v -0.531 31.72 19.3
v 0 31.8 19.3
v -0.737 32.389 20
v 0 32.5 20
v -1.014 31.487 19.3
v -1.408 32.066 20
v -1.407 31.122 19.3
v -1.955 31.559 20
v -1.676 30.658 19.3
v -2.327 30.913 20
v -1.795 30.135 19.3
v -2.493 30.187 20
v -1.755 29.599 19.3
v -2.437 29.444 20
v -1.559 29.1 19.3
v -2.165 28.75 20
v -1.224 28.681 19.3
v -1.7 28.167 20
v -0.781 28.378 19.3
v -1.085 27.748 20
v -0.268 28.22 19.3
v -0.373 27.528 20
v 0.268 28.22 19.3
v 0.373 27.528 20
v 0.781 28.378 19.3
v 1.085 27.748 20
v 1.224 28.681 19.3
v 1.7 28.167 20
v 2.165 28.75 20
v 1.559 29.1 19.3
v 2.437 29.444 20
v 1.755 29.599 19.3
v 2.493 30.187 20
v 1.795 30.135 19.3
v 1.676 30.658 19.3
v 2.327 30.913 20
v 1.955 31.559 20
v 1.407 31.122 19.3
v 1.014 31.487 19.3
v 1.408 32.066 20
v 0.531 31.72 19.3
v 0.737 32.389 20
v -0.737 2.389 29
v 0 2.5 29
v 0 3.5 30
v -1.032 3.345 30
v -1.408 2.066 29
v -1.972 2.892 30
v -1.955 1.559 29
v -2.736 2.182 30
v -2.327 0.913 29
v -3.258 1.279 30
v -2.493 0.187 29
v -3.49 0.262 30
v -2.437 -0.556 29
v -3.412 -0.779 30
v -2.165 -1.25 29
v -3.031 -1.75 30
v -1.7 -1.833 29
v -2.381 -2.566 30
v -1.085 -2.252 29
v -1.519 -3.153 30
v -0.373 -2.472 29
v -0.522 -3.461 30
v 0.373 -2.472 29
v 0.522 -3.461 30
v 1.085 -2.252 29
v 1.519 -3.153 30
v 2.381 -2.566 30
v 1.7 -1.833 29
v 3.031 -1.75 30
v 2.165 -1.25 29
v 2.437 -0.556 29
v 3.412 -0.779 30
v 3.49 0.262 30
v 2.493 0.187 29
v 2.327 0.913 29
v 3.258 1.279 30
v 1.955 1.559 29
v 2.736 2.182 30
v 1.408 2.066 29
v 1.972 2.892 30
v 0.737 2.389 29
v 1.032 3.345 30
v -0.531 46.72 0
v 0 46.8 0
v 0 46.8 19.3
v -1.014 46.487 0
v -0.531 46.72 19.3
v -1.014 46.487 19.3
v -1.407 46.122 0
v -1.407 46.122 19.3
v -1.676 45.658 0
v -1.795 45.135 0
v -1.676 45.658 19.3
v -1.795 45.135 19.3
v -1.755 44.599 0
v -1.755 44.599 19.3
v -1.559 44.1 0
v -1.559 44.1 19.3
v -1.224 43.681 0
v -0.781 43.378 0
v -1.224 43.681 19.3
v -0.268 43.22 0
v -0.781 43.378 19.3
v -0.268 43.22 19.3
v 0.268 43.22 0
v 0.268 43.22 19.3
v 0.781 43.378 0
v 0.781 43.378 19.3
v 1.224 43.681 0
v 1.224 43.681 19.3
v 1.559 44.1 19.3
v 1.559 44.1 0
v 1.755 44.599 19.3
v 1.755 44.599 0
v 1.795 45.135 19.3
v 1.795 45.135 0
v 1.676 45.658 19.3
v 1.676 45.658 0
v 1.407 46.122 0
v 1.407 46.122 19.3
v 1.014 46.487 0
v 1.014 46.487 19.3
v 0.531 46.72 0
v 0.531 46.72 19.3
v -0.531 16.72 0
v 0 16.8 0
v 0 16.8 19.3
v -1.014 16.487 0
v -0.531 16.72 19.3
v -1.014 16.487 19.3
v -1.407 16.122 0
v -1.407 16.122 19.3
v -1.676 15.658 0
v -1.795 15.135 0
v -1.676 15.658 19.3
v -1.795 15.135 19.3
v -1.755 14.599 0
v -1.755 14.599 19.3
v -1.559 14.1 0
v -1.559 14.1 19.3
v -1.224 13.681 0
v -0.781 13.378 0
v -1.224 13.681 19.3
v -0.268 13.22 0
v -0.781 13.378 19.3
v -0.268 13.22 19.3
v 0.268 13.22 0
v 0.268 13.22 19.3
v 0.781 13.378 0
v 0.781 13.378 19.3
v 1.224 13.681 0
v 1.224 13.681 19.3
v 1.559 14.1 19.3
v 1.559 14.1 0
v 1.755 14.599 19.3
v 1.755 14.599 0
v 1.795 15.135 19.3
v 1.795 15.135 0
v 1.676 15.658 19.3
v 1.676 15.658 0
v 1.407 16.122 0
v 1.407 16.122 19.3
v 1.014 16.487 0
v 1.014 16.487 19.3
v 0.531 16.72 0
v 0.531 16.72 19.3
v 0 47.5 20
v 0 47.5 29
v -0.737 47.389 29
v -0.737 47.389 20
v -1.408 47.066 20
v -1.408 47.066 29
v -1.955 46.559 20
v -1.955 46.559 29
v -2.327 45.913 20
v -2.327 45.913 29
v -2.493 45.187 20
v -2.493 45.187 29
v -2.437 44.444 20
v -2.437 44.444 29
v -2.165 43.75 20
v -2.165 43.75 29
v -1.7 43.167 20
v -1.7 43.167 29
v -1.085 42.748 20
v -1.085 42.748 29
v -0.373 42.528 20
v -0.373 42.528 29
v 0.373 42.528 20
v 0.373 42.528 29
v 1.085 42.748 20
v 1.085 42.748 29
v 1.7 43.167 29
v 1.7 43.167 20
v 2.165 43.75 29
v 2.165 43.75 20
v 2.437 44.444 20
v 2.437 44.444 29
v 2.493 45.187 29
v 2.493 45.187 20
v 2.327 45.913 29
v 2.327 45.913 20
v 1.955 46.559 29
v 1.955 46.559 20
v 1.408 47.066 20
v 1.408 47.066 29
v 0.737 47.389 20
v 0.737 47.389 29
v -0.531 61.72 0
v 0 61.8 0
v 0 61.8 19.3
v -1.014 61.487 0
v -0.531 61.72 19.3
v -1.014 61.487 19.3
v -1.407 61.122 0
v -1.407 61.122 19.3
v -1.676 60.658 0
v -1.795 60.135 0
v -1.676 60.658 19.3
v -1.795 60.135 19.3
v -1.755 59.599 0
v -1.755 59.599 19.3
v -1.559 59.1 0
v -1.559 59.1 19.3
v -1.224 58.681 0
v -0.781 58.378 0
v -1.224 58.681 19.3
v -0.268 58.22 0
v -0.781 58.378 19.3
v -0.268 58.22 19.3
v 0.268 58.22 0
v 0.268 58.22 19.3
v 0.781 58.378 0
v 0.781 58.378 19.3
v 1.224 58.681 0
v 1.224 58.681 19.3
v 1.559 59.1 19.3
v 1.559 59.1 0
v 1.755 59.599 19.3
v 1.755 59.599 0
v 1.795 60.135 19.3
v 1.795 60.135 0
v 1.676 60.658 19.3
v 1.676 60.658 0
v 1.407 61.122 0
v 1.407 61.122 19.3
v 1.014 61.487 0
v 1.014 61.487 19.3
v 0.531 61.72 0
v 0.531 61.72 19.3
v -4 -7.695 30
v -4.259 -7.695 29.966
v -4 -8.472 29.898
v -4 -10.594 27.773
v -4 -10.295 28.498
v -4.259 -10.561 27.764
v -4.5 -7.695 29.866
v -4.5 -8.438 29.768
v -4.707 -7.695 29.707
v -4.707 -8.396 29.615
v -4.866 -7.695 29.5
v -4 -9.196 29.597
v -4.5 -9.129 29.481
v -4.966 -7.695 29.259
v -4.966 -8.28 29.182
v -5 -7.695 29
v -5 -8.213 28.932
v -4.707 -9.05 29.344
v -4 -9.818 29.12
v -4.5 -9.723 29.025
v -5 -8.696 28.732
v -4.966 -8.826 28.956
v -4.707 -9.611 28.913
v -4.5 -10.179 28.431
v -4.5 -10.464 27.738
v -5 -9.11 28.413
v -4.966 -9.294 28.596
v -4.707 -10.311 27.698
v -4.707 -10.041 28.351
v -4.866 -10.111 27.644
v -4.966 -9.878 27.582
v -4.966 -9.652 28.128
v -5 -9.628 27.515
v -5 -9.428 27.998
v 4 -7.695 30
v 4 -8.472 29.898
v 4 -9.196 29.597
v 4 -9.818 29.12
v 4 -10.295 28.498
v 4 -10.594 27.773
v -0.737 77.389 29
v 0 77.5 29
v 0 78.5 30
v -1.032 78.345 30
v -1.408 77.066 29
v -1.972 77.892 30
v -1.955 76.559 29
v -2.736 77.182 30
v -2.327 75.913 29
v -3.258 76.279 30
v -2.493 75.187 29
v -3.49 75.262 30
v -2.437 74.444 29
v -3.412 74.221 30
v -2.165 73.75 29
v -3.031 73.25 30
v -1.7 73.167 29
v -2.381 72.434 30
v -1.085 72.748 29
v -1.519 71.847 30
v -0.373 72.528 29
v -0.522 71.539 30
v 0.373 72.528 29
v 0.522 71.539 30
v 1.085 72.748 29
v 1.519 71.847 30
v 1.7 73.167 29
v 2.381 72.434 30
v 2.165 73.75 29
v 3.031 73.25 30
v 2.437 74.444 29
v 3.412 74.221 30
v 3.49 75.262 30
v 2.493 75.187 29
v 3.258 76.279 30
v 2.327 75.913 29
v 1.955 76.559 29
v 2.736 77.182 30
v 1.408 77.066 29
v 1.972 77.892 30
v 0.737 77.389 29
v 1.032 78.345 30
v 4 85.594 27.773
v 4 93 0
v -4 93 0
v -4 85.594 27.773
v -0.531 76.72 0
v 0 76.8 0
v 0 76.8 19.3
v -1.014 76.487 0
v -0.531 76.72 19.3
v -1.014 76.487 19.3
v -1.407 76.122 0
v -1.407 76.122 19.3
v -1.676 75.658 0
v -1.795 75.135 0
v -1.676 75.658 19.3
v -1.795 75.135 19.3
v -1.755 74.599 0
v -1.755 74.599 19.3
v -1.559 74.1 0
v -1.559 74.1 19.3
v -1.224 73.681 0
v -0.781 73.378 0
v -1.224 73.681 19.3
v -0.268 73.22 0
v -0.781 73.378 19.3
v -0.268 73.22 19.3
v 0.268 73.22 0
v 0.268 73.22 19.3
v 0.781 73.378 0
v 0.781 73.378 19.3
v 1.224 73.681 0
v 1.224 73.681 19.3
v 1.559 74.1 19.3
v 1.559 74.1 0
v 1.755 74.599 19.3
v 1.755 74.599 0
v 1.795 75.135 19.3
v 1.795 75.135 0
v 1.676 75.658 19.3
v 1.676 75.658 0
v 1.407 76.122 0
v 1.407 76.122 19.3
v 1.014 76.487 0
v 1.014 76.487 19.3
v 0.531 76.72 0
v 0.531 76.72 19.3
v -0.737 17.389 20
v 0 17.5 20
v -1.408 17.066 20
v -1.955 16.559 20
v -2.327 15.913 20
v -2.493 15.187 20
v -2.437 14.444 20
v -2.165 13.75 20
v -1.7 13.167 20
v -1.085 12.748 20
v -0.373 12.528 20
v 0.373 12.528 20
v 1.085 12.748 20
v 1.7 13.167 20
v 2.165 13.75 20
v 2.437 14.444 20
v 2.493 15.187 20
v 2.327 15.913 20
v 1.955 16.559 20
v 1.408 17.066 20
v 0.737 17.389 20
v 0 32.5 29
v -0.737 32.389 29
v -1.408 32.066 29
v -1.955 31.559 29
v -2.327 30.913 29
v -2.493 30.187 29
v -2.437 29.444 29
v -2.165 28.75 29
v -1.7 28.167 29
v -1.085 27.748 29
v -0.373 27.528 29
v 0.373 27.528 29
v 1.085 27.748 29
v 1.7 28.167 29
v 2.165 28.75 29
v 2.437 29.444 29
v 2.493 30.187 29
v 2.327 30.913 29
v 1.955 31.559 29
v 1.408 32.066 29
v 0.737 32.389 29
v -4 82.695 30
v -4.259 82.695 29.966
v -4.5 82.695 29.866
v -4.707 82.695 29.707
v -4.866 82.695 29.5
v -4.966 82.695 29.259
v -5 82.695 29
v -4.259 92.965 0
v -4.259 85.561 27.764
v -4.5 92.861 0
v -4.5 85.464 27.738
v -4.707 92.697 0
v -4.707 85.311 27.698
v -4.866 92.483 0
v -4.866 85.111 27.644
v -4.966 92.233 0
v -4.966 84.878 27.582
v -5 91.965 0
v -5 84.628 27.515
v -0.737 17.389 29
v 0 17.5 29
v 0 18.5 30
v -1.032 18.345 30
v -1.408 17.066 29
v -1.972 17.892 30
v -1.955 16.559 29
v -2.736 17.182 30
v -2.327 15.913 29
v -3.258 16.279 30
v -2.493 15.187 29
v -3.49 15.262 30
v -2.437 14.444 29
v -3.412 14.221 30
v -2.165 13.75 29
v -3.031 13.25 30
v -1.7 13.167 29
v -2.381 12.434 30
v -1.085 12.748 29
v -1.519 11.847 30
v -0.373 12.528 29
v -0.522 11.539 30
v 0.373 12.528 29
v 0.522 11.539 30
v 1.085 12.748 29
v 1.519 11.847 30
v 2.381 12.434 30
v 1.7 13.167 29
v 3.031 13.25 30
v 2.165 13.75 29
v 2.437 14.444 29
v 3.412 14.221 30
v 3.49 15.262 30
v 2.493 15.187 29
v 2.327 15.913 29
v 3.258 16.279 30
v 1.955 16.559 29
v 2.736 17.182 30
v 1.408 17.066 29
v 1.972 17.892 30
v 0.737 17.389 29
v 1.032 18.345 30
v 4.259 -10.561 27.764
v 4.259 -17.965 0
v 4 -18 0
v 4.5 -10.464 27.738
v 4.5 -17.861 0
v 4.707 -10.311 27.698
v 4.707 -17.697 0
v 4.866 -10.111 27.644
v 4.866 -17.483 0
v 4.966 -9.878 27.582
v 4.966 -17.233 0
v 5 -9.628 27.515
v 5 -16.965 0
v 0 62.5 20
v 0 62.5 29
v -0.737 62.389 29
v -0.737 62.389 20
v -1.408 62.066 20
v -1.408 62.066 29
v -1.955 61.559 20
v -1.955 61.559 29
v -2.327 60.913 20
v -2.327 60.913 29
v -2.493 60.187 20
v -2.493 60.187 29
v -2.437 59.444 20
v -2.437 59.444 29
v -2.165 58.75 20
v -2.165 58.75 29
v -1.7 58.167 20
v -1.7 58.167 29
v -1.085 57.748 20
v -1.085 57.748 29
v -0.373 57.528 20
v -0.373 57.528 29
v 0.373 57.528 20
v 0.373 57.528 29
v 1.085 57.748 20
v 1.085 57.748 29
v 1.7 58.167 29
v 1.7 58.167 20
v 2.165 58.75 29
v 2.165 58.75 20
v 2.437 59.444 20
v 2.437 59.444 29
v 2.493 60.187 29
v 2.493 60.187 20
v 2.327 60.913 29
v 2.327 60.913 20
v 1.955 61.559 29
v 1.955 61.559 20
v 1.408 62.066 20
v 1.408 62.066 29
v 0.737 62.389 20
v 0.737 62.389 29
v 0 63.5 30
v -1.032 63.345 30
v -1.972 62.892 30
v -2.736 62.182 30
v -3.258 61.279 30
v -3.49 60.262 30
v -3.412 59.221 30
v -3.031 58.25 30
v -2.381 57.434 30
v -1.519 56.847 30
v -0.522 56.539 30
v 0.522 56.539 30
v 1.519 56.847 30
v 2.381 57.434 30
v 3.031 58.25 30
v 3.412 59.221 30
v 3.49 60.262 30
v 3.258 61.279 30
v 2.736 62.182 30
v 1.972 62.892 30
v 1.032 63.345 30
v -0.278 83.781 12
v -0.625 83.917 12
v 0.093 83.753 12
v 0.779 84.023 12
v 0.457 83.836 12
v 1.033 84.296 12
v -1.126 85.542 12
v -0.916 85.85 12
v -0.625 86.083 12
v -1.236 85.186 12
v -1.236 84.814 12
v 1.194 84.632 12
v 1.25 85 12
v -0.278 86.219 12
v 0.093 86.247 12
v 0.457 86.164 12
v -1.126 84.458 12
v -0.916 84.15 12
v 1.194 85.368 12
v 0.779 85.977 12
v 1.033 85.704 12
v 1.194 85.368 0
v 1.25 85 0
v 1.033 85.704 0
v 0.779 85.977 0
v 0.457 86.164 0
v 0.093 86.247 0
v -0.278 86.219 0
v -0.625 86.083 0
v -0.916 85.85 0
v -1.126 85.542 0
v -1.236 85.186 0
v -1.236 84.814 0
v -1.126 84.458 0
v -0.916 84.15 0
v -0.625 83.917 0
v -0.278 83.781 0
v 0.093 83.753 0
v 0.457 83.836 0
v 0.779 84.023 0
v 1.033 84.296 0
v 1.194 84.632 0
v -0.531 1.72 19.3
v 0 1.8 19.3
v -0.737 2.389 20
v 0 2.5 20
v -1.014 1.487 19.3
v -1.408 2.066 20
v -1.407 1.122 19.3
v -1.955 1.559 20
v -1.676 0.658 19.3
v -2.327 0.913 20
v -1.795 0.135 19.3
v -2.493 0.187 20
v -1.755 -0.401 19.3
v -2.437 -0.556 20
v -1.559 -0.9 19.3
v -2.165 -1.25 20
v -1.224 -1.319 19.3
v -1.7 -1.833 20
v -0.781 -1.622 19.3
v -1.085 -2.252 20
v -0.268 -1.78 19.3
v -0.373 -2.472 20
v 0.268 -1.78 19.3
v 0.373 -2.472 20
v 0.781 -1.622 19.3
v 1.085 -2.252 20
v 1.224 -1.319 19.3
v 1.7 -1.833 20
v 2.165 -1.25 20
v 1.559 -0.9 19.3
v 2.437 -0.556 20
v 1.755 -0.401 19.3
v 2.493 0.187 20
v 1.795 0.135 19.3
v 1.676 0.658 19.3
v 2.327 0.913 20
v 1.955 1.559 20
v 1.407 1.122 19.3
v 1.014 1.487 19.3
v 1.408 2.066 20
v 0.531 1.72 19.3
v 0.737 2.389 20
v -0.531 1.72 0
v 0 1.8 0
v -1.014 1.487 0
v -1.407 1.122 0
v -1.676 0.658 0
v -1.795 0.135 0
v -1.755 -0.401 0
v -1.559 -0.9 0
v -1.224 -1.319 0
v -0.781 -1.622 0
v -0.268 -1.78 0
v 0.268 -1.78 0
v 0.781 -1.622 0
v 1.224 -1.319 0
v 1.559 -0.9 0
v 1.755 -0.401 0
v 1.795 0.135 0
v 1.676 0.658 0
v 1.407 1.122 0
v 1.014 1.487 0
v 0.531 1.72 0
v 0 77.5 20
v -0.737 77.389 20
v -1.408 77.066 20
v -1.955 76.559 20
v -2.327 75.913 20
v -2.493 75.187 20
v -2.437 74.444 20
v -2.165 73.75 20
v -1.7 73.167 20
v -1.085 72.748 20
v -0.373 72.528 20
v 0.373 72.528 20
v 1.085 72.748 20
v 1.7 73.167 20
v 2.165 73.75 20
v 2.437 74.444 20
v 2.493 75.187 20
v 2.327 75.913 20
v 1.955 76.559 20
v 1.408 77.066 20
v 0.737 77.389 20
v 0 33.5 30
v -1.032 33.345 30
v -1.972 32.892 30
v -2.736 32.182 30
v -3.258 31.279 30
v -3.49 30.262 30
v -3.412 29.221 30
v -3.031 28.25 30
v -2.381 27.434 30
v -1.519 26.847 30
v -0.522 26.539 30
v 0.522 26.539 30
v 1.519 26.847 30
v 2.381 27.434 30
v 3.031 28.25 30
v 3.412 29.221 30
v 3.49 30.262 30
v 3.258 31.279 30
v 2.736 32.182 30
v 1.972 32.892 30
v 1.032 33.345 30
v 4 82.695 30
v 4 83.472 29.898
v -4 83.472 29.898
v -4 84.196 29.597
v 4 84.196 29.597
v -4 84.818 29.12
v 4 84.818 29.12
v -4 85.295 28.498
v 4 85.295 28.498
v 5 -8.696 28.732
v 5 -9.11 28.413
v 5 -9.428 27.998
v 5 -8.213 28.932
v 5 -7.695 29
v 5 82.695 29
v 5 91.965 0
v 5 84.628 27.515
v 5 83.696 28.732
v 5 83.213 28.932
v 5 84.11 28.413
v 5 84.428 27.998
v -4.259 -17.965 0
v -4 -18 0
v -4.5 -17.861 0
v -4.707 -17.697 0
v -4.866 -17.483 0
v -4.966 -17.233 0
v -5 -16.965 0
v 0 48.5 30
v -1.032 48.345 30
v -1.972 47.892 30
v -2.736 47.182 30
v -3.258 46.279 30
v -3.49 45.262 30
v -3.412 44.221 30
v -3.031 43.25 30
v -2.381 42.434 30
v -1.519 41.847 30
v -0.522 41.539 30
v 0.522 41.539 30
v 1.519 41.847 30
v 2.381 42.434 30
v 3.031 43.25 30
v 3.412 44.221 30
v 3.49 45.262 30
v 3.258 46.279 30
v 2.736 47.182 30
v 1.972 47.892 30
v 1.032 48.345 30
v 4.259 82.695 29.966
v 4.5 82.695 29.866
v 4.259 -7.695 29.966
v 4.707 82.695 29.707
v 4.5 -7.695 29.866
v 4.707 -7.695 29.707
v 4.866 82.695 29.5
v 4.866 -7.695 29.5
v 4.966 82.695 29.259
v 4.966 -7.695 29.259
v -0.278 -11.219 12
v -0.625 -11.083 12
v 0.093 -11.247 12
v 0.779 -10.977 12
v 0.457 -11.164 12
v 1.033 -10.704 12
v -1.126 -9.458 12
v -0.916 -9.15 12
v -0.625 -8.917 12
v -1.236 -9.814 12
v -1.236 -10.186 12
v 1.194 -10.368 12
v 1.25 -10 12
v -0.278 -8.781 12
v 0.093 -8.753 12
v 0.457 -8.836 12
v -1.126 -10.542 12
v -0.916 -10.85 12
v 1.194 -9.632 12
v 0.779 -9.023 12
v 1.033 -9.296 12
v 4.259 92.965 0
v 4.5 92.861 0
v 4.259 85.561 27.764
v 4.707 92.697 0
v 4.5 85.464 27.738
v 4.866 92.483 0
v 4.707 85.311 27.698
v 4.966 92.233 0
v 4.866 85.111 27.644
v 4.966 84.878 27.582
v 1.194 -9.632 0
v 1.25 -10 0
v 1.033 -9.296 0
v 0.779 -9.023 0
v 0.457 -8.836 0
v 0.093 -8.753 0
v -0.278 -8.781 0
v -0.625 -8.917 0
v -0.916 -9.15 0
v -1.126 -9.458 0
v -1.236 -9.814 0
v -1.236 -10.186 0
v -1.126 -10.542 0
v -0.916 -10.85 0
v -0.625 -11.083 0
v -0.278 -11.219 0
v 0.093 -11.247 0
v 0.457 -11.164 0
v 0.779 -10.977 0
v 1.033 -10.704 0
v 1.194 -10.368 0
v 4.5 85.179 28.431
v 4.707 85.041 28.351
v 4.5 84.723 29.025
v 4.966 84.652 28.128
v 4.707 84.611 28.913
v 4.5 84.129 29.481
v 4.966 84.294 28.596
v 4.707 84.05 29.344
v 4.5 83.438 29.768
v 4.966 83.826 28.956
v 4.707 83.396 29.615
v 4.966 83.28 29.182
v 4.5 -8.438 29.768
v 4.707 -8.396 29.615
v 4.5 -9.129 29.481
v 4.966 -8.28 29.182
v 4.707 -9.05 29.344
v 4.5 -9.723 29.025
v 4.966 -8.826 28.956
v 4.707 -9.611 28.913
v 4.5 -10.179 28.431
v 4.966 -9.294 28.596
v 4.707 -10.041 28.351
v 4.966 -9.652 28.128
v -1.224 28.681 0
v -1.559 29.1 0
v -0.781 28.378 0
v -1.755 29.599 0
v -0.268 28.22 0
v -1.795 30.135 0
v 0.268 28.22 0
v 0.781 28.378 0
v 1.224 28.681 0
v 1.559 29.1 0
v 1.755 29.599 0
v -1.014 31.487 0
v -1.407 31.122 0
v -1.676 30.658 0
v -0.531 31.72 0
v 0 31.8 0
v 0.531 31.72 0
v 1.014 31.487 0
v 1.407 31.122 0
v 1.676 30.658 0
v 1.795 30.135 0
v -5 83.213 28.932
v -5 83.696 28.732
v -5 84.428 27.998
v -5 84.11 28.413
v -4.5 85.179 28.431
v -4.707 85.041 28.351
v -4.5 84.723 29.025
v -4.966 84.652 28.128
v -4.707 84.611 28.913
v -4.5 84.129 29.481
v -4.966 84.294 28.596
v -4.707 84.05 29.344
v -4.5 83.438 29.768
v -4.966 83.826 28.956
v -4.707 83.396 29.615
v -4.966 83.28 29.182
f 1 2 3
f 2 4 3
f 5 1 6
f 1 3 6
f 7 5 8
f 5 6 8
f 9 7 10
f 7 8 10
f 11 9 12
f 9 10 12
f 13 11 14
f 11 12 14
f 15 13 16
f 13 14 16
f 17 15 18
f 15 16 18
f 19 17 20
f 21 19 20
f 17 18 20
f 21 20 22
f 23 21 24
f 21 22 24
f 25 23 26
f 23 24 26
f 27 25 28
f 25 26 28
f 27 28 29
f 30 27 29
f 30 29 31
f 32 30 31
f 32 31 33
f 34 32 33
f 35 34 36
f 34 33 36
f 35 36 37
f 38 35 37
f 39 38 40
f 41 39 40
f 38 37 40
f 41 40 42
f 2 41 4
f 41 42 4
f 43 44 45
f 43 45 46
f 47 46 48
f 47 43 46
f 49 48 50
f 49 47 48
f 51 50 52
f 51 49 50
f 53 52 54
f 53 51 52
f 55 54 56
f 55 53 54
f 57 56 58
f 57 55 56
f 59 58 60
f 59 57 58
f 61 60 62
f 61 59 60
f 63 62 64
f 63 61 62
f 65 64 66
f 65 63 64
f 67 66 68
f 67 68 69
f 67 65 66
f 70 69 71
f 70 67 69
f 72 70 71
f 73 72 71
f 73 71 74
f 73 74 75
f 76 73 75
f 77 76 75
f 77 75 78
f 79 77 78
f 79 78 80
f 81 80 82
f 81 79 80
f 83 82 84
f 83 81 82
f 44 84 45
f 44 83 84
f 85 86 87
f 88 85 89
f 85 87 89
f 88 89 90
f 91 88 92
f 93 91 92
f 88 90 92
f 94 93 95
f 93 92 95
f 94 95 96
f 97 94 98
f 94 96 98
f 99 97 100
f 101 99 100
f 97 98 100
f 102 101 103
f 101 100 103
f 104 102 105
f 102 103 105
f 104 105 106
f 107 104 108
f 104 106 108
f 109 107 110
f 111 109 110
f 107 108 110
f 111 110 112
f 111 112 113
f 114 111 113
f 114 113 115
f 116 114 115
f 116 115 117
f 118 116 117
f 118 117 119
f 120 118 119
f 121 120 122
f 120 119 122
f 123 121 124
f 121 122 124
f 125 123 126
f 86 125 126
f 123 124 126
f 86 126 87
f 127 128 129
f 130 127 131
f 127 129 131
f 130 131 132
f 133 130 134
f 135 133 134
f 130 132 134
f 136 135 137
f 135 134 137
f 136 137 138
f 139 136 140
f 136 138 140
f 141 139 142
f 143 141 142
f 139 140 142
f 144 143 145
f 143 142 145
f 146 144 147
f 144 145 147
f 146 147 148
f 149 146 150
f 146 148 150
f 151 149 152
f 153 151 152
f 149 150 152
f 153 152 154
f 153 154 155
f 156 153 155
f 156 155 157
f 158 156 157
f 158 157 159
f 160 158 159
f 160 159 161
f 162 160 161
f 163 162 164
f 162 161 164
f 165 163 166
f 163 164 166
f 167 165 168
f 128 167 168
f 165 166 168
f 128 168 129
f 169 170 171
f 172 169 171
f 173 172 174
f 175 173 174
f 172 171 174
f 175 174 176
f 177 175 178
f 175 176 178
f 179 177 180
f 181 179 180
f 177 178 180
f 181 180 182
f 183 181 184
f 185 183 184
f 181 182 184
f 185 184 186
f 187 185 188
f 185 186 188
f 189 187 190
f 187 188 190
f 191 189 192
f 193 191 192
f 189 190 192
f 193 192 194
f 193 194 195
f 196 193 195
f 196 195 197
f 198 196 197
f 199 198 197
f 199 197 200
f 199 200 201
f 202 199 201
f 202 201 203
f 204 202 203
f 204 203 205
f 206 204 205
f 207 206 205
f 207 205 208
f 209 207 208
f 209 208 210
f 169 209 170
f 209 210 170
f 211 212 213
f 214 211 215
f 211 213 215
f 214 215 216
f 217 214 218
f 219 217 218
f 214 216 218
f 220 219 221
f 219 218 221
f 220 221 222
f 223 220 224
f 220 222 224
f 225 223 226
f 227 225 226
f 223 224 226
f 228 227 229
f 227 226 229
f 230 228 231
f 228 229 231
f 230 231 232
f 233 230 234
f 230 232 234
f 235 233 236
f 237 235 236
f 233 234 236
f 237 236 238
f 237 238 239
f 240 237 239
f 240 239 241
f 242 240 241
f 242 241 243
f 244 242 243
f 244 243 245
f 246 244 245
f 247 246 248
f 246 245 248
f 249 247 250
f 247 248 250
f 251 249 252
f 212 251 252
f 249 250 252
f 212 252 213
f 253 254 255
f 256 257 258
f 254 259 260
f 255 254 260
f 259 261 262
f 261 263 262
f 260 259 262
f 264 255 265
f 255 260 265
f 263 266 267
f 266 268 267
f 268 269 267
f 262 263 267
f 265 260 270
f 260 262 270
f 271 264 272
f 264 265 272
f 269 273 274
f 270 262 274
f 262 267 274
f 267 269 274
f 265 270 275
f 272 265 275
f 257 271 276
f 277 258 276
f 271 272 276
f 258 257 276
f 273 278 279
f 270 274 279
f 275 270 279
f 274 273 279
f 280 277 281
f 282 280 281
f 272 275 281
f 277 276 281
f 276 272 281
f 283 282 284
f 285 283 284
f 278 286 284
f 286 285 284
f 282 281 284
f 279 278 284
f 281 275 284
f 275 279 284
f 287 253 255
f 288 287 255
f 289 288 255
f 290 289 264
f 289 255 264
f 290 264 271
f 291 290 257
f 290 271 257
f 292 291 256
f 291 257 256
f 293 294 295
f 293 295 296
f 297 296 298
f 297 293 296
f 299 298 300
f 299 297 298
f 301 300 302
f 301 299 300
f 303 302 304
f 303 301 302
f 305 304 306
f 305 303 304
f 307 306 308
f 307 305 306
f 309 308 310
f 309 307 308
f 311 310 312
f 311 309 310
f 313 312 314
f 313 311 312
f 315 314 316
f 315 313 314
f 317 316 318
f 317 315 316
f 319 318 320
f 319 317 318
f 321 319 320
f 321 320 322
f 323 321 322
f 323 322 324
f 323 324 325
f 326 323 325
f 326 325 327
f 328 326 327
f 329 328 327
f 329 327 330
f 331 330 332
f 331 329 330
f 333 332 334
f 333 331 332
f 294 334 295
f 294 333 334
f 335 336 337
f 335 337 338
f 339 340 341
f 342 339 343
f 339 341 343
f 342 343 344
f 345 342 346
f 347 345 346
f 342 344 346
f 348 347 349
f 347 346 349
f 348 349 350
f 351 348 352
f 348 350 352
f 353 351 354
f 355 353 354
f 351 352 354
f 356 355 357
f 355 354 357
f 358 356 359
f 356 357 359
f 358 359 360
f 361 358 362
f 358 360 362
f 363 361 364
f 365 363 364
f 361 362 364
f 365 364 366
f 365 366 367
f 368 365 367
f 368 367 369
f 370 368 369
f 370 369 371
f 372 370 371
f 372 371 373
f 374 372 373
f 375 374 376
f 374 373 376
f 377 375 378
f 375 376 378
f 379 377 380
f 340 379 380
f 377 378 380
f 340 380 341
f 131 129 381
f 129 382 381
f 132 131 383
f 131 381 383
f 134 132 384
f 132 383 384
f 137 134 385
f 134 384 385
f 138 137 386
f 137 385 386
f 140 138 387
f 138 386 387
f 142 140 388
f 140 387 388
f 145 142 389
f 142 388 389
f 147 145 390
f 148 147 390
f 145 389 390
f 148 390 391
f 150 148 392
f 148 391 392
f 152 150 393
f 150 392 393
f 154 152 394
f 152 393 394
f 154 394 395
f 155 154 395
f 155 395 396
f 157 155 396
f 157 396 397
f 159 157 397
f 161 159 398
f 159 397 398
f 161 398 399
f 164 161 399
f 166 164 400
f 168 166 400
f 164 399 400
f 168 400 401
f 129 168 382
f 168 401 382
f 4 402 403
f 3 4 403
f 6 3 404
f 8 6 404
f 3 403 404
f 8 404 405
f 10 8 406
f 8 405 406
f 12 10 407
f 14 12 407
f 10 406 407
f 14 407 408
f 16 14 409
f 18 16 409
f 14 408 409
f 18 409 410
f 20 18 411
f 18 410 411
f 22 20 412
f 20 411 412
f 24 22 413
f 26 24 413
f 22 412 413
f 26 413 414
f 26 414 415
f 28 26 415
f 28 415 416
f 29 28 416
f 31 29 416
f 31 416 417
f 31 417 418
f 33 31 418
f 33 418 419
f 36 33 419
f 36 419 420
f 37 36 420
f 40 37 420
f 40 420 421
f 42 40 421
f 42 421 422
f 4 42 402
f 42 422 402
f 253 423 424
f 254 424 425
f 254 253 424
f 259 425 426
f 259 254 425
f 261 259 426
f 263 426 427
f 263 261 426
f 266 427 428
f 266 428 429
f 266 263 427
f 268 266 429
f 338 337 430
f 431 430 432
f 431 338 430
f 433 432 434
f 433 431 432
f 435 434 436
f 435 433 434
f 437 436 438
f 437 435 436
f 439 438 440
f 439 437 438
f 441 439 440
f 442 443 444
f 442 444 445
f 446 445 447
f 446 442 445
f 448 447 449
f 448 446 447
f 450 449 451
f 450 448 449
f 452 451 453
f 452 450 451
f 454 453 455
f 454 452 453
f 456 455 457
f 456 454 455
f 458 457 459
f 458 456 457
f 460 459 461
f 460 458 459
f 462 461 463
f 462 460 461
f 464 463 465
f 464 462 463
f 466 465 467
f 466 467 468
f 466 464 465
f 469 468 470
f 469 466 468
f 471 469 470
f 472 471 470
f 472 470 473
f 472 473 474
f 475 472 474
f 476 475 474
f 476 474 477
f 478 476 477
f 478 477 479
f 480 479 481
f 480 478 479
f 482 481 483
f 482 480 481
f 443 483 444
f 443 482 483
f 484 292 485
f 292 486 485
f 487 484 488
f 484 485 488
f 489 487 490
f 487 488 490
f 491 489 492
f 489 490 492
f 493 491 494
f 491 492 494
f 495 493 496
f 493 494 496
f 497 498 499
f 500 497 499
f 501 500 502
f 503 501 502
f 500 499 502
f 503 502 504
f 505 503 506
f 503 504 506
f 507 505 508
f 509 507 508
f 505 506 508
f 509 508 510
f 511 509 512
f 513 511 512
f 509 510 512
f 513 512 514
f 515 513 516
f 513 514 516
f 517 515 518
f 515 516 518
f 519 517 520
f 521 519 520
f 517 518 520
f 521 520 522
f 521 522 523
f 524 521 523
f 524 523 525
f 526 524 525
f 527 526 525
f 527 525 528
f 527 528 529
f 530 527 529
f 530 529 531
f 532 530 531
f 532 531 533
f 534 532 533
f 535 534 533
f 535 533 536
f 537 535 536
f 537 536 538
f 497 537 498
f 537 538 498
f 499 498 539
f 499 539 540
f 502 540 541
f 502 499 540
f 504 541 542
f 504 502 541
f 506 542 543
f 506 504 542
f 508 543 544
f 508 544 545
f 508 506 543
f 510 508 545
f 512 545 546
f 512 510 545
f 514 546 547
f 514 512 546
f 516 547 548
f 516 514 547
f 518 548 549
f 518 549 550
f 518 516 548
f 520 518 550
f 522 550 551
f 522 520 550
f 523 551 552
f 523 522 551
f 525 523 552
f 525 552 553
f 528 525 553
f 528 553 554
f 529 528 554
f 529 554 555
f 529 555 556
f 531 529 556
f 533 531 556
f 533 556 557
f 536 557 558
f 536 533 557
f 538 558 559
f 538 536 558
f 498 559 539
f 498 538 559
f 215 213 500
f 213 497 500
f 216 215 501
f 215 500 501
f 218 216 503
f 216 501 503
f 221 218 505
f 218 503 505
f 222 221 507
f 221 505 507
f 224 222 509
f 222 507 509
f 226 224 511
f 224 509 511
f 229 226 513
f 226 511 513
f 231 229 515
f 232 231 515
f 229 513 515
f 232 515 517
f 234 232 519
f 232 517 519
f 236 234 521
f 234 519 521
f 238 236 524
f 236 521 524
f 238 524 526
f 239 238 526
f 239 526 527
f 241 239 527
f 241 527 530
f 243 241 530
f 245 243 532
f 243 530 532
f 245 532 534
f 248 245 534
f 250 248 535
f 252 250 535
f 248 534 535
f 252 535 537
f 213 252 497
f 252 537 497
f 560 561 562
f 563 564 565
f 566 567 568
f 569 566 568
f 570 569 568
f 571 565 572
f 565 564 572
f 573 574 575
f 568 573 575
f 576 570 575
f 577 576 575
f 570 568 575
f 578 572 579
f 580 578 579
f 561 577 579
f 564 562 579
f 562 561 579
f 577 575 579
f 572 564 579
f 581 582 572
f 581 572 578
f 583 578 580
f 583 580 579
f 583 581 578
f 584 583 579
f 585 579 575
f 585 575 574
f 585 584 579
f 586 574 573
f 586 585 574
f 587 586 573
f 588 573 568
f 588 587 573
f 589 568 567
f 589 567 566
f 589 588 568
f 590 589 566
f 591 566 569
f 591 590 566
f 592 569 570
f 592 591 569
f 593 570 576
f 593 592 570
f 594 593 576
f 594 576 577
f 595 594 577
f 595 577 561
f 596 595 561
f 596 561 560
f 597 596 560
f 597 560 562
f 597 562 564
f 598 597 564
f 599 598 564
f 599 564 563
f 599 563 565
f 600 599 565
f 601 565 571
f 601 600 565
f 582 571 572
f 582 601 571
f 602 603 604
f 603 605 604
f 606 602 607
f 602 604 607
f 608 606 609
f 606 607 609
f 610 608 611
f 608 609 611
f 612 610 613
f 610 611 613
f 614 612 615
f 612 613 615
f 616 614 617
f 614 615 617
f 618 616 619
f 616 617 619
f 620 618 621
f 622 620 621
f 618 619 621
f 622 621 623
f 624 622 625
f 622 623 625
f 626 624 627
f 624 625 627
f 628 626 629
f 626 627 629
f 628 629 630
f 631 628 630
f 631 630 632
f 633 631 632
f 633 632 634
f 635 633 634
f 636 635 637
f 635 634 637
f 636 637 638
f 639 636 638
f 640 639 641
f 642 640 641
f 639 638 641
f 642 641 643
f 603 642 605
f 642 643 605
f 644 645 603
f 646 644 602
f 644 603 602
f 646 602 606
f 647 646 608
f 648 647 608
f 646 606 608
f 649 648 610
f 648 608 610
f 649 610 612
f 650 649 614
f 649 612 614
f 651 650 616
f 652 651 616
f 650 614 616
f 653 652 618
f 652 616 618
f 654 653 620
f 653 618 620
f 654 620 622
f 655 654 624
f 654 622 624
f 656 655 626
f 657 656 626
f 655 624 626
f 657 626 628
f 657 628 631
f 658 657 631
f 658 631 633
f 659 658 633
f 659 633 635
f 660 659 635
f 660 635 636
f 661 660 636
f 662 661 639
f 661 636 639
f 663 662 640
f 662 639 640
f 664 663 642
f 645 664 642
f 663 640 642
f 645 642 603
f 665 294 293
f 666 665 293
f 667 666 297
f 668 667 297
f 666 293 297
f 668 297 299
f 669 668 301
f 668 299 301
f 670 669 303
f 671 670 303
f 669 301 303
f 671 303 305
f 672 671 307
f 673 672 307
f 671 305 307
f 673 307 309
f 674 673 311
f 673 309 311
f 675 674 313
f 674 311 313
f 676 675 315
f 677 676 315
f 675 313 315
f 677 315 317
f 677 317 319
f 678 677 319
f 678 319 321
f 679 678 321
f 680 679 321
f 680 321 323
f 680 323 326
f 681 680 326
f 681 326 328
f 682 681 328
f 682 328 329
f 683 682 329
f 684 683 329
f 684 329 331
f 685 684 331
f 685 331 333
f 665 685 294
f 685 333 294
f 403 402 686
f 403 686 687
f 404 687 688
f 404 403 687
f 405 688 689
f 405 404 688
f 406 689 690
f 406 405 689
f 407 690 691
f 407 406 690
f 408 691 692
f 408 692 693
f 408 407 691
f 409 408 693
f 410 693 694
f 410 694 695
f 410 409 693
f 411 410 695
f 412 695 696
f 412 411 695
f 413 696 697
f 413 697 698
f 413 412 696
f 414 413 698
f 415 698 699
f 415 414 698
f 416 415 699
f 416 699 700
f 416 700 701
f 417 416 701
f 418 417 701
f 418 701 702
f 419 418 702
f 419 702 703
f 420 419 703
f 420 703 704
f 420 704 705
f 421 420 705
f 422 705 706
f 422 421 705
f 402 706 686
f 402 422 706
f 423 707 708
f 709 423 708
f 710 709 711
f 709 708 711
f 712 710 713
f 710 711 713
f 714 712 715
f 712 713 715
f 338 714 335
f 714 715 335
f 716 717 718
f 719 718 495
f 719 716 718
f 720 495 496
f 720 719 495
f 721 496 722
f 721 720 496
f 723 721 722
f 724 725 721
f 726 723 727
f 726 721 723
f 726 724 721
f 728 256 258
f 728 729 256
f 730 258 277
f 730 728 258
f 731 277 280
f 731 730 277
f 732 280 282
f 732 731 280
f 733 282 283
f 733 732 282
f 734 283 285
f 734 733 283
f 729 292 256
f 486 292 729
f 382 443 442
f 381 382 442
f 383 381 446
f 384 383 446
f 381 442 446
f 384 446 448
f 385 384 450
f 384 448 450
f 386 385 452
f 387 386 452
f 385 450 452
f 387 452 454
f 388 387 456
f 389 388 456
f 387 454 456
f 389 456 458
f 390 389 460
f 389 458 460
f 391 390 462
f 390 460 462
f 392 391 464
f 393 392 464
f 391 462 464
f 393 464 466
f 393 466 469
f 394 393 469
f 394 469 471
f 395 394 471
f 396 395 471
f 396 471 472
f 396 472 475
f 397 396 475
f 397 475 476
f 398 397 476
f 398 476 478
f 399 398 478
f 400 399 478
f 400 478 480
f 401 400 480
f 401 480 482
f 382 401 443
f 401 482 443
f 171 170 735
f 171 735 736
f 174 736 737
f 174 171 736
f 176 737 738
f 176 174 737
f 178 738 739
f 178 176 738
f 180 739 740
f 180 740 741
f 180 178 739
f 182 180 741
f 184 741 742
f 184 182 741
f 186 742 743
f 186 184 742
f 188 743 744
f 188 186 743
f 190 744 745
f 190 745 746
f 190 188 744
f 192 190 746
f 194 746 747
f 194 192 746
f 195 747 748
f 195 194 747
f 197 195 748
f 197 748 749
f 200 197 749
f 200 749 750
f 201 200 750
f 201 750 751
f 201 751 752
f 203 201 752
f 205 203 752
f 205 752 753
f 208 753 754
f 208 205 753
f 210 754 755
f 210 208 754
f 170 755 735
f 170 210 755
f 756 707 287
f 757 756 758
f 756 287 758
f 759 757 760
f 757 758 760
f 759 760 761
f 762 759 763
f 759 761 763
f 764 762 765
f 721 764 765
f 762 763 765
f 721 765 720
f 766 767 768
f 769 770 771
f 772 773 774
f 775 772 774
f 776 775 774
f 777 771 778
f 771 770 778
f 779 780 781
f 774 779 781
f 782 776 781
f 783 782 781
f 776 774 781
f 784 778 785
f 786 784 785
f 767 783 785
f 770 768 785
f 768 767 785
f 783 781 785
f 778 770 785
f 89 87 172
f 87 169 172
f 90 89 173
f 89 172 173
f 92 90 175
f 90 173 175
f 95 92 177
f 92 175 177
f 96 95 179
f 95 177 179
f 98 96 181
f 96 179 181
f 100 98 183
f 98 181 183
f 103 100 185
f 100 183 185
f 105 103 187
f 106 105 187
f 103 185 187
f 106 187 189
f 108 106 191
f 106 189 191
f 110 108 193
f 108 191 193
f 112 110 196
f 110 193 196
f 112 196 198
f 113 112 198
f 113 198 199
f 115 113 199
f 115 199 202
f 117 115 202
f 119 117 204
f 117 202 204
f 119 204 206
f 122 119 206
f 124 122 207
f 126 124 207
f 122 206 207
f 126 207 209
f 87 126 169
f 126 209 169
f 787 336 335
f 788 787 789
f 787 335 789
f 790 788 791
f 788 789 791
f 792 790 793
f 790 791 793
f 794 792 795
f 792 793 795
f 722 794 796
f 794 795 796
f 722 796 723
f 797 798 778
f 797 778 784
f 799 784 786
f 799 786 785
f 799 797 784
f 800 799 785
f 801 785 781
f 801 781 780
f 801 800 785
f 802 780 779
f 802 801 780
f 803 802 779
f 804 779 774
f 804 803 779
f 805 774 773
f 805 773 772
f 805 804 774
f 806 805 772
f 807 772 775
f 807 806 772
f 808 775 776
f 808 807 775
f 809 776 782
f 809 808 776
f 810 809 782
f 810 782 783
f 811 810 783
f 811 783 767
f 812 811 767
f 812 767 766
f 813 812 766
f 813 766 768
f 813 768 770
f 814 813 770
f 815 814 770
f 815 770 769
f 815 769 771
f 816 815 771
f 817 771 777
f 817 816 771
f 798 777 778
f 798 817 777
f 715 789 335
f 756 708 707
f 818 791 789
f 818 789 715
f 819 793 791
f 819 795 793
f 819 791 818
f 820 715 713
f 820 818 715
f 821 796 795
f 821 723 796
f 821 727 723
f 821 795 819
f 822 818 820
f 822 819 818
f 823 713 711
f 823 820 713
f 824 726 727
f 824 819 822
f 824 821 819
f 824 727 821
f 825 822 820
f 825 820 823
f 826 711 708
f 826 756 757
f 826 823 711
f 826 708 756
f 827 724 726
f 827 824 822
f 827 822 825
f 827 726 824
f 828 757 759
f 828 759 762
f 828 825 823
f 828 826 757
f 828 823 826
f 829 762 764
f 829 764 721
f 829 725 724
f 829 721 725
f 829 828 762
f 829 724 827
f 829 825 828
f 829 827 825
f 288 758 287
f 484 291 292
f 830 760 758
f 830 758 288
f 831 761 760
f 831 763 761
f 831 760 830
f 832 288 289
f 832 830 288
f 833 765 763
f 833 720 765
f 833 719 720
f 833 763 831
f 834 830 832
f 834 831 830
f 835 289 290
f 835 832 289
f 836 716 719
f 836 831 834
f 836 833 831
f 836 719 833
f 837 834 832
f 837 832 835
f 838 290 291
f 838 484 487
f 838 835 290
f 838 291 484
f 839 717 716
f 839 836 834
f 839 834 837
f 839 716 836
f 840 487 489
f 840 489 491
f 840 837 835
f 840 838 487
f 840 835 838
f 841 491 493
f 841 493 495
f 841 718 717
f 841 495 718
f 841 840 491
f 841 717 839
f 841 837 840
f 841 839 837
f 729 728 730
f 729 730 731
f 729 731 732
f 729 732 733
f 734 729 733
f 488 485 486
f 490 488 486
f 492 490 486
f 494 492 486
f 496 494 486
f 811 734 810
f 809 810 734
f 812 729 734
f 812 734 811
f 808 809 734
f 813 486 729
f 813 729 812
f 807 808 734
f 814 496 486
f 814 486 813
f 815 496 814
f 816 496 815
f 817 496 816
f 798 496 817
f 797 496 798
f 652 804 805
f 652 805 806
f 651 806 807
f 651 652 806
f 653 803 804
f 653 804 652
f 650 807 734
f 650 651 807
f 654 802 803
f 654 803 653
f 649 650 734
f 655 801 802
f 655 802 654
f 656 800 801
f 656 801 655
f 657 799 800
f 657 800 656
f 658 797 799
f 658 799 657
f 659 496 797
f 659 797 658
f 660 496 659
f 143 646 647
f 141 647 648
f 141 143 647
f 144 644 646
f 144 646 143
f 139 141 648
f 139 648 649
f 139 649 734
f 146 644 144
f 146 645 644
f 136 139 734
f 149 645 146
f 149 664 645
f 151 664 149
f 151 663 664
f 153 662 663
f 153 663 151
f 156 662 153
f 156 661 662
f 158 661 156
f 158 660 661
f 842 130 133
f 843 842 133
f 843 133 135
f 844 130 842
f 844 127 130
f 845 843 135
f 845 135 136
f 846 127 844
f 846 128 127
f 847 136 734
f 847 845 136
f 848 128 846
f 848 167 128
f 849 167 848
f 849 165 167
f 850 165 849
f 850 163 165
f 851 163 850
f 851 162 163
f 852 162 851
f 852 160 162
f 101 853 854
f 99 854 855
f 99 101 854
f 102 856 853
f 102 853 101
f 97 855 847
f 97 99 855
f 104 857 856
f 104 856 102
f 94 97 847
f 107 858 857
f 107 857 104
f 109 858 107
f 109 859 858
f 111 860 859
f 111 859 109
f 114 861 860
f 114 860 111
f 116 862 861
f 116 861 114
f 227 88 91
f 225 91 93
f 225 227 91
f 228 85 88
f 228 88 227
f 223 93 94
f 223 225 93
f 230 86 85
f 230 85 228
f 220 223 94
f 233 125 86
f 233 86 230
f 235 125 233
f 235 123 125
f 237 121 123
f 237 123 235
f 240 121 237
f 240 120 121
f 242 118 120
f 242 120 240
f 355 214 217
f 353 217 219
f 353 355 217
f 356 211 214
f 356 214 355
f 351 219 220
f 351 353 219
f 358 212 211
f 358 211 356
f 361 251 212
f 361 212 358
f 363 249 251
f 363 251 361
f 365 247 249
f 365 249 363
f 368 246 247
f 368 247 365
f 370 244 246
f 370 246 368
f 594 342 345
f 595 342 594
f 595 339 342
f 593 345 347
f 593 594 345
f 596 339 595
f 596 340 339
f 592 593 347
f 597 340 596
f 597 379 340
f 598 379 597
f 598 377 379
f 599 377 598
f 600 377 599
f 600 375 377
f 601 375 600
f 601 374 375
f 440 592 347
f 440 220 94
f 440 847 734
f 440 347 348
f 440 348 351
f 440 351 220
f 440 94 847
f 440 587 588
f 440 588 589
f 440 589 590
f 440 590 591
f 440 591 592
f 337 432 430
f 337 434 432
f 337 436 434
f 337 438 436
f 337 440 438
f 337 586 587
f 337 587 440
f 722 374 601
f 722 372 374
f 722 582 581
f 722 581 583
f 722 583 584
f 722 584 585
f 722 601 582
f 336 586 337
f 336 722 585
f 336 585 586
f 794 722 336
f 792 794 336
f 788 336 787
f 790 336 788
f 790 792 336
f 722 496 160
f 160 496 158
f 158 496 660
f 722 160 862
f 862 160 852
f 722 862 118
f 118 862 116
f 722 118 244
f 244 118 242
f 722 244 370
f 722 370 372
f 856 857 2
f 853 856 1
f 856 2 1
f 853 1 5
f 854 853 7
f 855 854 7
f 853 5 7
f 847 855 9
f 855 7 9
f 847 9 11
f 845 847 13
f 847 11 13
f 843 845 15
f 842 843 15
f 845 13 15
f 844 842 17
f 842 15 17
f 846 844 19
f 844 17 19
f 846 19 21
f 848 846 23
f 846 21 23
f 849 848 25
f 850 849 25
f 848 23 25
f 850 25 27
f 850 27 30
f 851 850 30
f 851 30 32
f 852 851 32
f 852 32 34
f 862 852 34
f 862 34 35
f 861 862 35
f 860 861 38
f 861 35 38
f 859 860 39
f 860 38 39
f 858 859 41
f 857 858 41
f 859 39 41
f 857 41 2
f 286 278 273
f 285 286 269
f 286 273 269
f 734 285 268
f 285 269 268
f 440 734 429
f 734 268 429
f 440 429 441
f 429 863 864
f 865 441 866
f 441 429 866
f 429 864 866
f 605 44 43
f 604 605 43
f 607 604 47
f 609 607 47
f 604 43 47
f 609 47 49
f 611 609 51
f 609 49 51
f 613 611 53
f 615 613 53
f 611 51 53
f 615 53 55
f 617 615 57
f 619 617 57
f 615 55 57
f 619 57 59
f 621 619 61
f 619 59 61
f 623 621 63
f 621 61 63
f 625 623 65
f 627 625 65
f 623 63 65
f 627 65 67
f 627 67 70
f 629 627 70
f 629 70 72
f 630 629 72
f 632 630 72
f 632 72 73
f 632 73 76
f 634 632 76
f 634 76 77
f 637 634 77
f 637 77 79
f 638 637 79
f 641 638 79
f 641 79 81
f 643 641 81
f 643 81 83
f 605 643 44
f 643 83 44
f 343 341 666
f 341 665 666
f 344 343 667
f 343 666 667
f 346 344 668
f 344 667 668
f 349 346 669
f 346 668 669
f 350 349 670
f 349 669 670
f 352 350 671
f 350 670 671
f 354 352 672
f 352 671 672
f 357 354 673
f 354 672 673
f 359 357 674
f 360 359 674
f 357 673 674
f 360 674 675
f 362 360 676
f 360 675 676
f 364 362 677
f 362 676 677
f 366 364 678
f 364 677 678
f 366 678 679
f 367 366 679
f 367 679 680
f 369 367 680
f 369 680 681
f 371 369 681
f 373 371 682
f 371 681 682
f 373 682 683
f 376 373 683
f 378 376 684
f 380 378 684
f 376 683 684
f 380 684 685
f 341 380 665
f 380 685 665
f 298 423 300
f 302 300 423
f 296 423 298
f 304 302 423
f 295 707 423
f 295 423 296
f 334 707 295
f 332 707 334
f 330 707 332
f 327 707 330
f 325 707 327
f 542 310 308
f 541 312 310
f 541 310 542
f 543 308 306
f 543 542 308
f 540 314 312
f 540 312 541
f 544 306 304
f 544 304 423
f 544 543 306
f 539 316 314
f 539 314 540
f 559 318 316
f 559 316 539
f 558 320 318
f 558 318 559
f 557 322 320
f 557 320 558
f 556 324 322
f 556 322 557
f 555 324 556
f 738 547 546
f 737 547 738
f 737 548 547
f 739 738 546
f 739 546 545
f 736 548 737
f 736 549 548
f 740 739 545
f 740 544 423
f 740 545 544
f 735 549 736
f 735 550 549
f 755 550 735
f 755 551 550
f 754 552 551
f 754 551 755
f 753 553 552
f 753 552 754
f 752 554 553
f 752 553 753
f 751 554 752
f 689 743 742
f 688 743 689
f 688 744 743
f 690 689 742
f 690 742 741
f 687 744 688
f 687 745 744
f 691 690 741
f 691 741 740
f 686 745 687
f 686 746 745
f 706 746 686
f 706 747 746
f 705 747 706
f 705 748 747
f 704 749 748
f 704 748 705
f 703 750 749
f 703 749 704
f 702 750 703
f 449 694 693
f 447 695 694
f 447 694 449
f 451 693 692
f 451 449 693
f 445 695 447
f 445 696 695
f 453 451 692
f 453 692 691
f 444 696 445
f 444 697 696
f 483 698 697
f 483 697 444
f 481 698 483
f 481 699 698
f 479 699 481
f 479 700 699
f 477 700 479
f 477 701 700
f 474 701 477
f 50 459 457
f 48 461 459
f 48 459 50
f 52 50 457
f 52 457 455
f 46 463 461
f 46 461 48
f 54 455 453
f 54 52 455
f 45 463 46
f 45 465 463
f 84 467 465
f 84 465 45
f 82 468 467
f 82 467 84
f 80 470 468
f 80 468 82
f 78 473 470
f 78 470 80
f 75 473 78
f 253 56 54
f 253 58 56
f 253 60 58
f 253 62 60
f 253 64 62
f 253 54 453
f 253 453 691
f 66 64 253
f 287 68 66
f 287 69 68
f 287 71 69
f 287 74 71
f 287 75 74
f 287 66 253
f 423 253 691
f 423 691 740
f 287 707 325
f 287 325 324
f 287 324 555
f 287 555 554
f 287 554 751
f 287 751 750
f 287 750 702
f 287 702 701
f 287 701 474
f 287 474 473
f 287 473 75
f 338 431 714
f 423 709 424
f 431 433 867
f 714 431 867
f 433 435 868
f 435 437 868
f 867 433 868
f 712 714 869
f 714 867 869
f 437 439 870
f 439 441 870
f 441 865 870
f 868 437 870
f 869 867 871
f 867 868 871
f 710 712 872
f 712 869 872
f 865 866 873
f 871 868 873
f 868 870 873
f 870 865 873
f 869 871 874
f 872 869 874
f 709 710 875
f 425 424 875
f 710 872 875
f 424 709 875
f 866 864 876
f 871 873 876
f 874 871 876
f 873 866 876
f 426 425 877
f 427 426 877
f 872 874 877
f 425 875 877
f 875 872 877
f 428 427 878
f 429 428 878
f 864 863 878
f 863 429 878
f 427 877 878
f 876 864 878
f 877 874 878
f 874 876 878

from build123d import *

# Parameters (mm, degrees)
PAD012_DEPTH           = 5
LINEARPATTERN002_COUNT = 6
LINEARPATTERN002_PITCH = 15
SKETCH031_R            = 1.25
POCKET011_DEPTH        = 12
CHAMFER004_SIZE        = 1
FILLET004_R            = 3
FILLET005_R            = 1


with BuildPart() as part:
    # Sketch029 → Pad012 (new body, symmetric)
    with BuildSketch(Plane.YZ):
        Polygon((-18, 0), (93, 0), (85, 30), (-10, 30), align=None)
    extrude(amount=PAD012_DEPTH, both=True)

    # Sketch030 → Groove (revolve, cut)
    with BuildSketch(Plane.YZ):
        Polygon((0, 0), (1.8, 0), (1.8, 19.3), (2.5, 20), (2.5, 30), (0, 30), align=None)
    groove = revolve(axis=Axis((0, 0, 0), (0, 0, 1)), mode=Mode.SUBTRACT)

    # LinearPattern002: Groove ×6
    with Locations(*[(0, i * LINEARPATTERN002_PITCH, 0) for i in range(1, LINEARPATTERN002_COUNT)]):
        add(groove, mode=Mode.SUBTRACT)

    # Sketch031 → Pocket011 (cut)
    with BuildSketch(Plane.XY):
        with Locations((0, 85)):
            Circle(SKETCH031_R)
        with Locations((0, -10)):
            Circle(SKETCH031_R)
    extrude(amount=POCKET011_DEPTH, mode=Mode.SUBTRACT)

    # Chamfer004
    chamfer004_edges = [part.edges().sort_by_distance(p)[0] for p in [
        (0, -2.5, 30),
        (0, 12.5, 30),
        (0, 27.5, 30),
        (0, 42.5, 30),
        (0, 57.5, 30),
        (0, 72.5, 30),
    ]]
    chamfer(chamfer004_edges, length=CHAMFER004_SIZE)

    # Fillet004
    fillet004_edges = [part.edges().sort_by_distance(p)[0] for p in [
        (0, -10, 30),
        (0, 85, 30),
    ]]
    fillet(fillet004_edges, radius=FILLET004_R)

    # Fillet005
    fillet005_edges = [part.edges().sort_by_distance(p)[0] for p in [
        (5, -9.522873, 29.378967),
        (-5, 37.5, 30),
    ]]
    fillet(fillet005_edges, radius=FILLET005_R)


solid = part.part
